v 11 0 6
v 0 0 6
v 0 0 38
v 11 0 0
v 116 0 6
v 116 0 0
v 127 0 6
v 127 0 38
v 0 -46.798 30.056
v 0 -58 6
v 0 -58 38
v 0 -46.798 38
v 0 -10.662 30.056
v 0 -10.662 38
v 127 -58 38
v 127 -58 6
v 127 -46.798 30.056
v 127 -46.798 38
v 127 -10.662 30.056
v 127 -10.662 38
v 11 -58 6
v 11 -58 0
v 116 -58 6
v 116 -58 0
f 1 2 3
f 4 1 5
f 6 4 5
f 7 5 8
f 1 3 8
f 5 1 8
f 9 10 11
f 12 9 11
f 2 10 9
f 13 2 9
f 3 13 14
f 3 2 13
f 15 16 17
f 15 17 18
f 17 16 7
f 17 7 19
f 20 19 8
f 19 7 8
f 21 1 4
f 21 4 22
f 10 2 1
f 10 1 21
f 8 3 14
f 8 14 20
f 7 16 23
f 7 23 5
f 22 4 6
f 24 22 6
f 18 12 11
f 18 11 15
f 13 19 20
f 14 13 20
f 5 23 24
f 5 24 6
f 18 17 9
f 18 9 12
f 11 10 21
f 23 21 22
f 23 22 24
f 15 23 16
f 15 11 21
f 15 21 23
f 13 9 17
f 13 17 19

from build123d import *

# Parameters (mm, degrees)
F0_W     = 127
F0_H     = 38
F1_DEPTH = 58
F2_W     = 58
F2_H     = 6
F3_DEPTH = 11
F4_W     = 58
F4_H     = 6
F5_DEPTH = 11
F6_W     = 36.136753
F6_H     = 7.943855
F7_DEPTH = 200


with BuildPart() as f1:
    # F0 (on Front) → F1 (new body)
    with BuildSketch(Plane.XZ):
        with Locations((63.5, 19)):
            Rectangle(F0_W, F0_H)
    extrude(amount=F1_DEPTH)

    # F2 (on face) → F3 (cut)
    with BuildSketch(Plane.YZ.offset(127)):
        with Locations((-29, 3)):
            Rectangle(F2_W, F2_H)
    extrude(amount=-F3_DEPTH, mode=Mode.SUBTRACT)

    # F4 (on face) → F5 (cut)
    with BuildSketch(Plane(origin=(0, 0, 0), x_dir=(0, -1, 0), z_dir=(-1, 0, 0))):
        with Locations((29, 3)):
            Rectangle(F4_W, F4_H)
    extrude(amount=-F5_DEPTH, mode=Mode.SUBTRACT)

    # F6 (on face) → F7 (cut)
    with BuildSketch(Plane.YZ.offset(127)):
        with Locations((-28.729976, 34.028073)):
            Rectangle(F6_W, F6_H)
    extrude(amount=-F7_DEPTH, mode=Mode.SUBTRACT)


solid = f1.part
